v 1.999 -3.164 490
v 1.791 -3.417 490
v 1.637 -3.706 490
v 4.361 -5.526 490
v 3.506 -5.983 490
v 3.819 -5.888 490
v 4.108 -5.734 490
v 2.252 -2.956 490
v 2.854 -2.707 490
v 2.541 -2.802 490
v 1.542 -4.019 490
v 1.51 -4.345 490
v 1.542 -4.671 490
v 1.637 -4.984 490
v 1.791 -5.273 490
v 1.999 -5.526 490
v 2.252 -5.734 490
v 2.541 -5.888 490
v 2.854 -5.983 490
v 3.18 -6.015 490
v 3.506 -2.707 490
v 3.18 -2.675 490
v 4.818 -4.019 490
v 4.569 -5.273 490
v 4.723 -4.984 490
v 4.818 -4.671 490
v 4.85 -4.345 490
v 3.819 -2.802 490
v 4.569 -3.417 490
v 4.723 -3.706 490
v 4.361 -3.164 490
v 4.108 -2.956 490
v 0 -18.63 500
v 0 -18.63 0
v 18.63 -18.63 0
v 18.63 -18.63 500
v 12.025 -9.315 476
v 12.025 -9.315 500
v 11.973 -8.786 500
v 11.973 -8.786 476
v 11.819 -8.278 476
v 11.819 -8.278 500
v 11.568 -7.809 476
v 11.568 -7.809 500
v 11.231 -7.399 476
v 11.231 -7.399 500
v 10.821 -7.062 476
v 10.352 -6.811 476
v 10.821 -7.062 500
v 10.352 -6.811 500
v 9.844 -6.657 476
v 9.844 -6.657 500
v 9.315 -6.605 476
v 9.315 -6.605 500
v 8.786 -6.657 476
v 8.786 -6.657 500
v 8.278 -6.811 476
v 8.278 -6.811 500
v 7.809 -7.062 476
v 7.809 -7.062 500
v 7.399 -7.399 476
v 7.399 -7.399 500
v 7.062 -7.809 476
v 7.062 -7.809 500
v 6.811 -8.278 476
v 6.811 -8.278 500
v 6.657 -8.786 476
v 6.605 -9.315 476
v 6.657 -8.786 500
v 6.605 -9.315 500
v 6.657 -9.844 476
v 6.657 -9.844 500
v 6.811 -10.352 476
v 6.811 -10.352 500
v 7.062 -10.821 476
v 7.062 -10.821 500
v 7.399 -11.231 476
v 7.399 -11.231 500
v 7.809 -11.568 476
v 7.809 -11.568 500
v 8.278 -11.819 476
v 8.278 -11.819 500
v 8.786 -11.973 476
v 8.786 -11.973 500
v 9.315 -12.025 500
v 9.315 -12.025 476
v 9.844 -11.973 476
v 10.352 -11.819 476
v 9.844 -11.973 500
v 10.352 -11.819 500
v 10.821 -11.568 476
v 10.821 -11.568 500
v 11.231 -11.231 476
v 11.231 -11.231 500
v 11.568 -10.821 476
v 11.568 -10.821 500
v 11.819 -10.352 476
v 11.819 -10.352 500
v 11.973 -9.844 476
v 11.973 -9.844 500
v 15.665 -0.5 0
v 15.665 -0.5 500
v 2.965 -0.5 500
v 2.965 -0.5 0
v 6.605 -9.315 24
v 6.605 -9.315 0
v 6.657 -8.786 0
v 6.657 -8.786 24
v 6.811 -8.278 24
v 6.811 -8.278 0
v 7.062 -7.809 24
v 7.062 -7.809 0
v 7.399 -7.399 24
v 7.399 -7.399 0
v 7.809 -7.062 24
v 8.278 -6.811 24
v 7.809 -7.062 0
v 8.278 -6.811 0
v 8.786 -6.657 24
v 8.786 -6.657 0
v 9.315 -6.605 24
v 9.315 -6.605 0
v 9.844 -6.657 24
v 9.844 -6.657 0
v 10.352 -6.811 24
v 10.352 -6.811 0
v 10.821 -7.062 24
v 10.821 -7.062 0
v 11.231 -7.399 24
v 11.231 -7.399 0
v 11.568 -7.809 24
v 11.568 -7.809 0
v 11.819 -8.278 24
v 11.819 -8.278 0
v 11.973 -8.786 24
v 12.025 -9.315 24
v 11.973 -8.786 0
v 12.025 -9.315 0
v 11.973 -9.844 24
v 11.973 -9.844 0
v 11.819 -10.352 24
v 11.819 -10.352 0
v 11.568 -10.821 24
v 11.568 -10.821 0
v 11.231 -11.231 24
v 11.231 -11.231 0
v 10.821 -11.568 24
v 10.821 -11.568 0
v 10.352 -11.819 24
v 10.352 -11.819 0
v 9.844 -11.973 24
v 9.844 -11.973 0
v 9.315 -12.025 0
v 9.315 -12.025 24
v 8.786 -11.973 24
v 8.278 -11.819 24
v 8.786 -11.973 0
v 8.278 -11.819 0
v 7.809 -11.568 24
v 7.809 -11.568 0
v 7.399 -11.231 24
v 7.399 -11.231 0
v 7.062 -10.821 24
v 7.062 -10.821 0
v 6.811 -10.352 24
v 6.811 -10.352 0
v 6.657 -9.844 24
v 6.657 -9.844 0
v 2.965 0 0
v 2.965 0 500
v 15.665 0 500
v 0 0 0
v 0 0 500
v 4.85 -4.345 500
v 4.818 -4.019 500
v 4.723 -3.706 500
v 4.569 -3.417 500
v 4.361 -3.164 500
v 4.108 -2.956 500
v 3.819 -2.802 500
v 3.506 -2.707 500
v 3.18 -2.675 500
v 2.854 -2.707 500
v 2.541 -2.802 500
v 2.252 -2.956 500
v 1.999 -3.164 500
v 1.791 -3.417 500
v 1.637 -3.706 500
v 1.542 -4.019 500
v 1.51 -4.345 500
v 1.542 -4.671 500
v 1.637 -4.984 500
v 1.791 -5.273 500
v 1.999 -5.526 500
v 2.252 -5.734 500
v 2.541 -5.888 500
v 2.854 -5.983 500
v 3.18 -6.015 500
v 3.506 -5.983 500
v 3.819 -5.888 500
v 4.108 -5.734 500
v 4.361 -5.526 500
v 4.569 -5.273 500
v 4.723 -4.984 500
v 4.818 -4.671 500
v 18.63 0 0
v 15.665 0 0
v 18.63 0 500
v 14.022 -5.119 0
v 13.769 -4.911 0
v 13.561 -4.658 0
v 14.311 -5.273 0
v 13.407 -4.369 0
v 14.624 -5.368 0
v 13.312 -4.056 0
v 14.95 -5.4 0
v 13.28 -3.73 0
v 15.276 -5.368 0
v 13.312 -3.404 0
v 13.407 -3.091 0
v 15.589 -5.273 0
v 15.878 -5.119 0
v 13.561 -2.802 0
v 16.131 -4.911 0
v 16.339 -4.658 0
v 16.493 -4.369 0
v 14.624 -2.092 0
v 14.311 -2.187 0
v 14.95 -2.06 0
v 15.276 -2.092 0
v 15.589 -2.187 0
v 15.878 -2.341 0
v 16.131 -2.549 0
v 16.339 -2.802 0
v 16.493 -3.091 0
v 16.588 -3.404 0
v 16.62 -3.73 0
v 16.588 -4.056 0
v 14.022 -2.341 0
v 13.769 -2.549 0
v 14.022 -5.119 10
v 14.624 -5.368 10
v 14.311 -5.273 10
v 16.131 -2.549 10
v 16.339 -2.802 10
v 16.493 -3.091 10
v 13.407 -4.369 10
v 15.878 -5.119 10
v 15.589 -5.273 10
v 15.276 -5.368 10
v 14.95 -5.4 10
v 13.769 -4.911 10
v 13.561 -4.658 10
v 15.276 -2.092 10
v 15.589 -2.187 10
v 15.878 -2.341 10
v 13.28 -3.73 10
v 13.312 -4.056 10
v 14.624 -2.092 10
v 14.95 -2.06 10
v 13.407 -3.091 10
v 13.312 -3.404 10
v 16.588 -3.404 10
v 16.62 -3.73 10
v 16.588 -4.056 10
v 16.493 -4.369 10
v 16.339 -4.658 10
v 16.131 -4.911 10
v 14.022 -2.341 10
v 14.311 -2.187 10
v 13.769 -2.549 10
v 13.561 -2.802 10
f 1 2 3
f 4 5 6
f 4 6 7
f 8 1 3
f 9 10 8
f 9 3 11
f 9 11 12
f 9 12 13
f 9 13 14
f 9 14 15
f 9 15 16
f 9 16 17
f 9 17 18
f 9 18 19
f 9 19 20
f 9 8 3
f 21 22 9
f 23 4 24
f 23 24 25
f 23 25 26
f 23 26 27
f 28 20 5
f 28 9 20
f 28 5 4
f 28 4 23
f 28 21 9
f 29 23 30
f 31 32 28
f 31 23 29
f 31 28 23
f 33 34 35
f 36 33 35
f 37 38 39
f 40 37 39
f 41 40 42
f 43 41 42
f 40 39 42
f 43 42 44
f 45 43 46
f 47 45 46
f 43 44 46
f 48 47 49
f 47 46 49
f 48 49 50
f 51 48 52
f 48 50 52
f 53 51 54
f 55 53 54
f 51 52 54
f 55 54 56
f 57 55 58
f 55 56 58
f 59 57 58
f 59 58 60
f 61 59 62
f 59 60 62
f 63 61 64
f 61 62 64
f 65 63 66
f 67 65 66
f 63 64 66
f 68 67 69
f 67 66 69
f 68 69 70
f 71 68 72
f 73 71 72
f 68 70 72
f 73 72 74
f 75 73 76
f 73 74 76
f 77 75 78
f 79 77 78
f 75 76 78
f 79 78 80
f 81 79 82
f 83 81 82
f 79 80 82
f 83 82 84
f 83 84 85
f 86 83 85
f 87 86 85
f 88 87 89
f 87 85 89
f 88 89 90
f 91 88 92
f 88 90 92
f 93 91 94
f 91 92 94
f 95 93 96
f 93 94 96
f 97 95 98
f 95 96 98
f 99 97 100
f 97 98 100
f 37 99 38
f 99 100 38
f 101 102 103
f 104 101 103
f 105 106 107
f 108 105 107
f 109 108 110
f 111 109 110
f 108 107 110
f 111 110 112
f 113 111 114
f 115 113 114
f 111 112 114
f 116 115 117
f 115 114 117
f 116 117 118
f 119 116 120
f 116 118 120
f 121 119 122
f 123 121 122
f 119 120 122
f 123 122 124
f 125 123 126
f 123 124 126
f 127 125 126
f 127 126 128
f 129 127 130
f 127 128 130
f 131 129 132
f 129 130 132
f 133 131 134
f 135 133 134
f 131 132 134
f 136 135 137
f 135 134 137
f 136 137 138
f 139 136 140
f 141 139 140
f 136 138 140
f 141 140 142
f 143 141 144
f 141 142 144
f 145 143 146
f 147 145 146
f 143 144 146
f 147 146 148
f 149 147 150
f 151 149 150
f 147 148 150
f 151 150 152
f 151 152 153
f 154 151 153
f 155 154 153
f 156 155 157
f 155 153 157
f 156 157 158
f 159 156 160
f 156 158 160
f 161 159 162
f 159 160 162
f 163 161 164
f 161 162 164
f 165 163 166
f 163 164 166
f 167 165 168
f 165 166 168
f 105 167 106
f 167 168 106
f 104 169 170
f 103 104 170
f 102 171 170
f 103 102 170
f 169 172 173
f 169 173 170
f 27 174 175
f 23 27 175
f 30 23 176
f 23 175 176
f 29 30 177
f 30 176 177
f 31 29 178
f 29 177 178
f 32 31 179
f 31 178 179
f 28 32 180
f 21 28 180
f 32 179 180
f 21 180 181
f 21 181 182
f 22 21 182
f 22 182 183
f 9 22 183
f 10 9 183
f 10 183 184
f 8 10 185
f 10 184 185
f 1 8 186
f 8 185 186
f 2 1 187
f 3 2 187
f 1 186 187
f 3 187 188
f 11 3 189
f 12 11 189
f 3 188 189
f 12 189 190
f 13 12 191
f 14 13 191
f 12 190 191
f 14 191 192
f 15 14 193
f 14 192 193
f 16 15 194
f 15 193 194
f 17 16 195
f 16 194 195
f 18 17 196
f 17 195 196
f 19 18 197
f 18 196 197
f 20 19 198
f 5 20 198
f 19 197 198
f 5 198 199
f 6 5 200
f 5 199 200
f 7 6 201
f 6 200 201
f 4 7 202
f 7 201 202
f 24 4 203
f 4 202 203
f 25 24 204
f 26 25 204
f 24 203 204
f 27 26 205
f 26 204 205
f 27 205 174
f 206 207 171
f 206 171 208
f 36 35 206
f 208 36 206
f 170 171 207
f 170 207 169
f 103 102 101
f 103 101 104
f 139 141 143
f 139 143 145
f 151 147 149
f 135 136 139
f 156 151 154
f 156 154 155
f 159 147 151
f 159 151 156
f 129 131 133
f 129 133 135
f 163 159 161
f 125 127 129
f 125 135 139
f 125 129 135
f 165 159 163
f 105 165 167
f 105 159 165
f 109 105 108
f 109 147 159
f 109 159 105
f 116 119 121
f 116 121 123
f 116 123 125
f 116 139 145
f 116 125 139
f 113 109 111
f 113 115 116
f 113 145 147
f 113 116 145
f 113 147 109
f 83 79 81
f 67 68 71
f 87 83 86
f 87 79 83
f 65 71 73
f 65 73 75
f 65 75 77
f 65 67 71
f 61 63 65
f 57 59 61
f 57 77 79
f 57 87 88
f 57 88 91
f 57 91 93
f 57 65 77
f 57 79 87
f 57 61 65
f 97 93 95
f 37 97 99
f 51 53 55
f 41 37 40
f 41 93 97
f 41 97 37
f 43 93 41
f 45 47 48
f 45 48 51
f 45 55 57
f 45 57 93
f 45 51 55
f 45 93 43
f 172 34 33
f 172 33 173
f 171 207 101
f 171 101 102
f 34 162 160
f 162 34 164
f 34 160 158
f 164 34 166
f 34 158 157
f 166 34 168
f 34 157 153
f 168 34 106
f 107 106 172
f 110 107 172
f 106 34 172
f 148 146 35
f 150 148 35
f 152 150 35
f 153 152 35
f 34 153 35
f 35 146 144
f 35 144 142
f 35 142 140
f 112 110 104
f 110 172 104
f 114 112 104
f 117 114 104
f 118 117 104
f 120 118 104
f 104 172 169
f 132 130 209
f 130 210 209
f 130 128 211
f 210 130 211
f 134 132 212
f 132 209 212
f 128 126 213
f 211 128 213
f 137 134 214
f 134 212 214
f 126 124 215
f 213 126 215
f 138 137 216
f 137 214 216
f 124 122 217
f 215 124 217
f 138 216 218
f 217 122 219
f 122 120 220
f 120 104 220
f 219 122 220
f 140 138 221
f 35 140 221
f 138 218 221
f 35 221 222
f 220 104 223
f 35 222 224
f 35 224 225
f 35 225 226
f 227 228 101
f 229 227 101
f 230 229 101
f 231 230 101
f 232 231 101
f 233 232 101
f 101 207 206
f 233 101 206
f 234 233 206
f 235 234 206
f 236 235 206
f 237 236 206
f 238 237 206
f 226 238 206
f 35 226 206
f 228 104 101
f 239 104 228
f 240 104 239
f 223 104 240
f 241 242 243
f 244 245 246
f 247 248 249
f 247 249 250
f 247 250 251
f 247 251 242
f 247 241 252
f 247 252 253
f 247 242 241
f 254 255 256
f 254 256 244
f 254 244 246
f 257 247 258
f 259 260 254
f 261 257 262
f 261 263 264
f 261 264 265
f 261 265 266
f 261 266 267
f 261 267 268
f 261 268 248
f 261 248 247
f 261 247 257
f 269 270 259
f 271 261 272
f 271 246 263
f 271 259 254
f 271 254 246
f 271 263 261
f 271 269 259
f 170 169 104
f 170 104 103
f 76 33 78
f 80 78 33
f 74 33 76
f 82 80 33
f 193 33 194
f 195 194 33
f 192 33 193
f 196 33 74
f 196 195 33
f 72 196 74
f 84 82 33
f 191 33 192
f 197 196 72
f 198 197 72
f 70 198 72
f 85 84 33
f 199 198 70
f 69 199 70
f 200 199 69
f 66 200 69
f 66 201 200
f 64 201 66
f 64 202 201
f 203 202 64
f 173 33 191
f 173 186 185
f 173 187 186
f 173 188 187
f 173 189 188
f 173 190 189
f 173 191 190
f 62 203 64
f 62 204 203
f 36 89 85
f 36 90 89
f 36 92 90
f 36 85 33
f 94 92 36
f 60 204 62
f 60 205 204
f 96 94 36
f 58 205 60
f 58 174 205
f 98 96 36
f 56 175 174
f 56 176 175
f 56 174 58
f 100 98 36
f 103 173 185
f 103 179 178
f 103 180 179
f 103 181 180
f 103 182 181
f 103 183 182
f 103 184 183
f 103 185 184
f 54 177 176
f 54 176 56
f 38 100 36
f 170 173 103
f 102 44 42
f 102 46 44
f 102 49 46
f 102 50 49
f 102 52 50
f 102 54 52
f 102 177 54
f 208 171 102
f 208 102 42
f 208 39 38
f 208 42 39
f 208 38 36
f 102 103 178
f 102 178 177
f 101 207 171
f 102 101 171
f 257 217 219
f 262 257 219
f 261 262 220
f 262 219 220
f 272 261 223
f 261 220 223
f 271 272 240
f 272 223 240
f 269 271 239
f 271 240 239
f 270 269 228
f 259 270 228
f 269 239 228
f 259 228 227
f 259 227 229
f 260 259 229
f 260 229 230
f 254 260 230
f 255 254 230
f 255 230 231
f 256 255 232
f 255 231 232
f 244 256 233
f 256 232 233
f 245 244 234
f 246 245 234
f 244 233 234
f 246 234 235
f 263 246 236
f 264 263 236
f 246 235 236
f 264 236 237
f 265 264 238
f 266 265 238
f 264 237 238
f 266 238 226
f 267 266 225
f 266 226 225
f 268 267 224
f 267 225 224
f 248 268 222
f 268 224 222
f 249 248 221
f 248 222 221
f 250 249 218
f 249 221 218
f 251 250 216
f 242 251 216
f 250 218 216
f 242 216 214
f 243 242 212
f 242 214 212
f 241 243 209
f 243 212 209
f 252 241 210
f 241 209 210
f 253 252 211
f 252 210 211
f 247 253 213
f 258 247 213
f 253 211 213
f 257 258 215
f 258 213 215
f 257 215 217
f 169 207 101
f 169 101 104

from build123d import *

# Parameters (mm, degrees)
SKETCH1_W           = 18.63
SKETCH1_H           = 18.63
BOSS_EXTRUDE1_DEPTH = 500
SKETCH2_R           = 2.71
CUT_EXTRUDE1_DEPTH  = 24
SKETCH3_R           = 2.71
CUT_EXTRUDE2_DEPTH  = 24
SKETCH4_R           = 1.67
CUT_EXTRUDE3_DEPTH  = 10
SKETCH5_R           = 1.67
CUT_EXTRUDE4_DEPTH  = 10
SKETCH6_W           = 12.7
SKETCH6_H           = 500
CUT_EXTRUDE5_DEPTH  = 0.5
SKETCH7_W           = 12.7
SKETCH7_H           = 500
BOSS_EXTRUDE2_DEPTH = 0.5


with BuildPart() as part:
    # Sketch1 → Boss-Extrude1 (new body)
    with BuildSketch(Plane.XY):
        with Locations((9.315, -9.315)):
            Rectangle(SKETCH1_W, SKETCH1_H)
    extrude(amount=BOSS_EXTRUDE1_DEPTH)

    # Sketch2 → Cut-Extrude1 (cut)
    with BuildSketch(Plane(origin=(0, 0, 0), x_dir=(-1, 0, 0), z_dir=(0, 0, -1))):
        with Locations((-9.315, -9.315)):
            Circle(SKETCH2_R)
    extrude(amount=-CUT_EXTRUDE1_DEPTH, mode=Mode.SUBTRACT)

    # Sketch3 → Cut-Extrude2 (cut)
    with BuildSketch(Plane.XY.offset(500)):
        with Locations((9.315, -9.315)):
            Circle(SKETCH3_R)
    extrude(amount=-CUT_EXTRUDE2_DEPTH, mode=Mode.SUBTRACT)

    # Sketch4 → Cut-Extrude3 (cut)
    with BuildSketch(Plane(origin=(0, 0, 0), x_dir=(-1, 0, 0), z_dir=(0, 0, -1))):
        with Locations((-14.95, -3.73)):
            Circle(SKETCH4_R)
    extrude(amount=-CUT_EXTRUDE3_DEPTH, mode=Mode.SUBTRACT)

    # Sketch5 → Cut-Extrude4 (cut)
    with BuildSketch(Plane.XY.offset(500)):
        with Locations((3.18, -4.345)):
            Circle(SKETCH5_R)
    extrude(amount=-CUT_EXTRUDE4_DEPTH, mode=Mode.SUBTRACT)

    # Sketch6 → Cut-Extrude5 (cut)
    with BuildSketch(Plane(origin=(0, 0, 0), x_dir=(-1, 0, 0), z_dir=(0, 1, 0))):
        with Locations((-9.315, 250)):
            Rectangle(SKETCH6_W, SKETCH6_H)
    extrude(amount=-CUT_EXTRUDE5_DEPTH, mode=Mode.SUBTRACT)


with BuildPart() as body_2:
    # Sketch7 → Boss-Extrude2 (new body)
    with BuildSketch(Plane(origin=(0, 0, 0), x_dir=(-1, 0, 0), z_dir=(0, 1, 0))):
        with Locations((-9.315, 250)):
            Rectangle(SKETCH7_W, SKETCH7_H)
    extrude(amount=-BOSS_EXTRUDE2_DEPTH)


solid = Compound([part.part, body_2.part])
